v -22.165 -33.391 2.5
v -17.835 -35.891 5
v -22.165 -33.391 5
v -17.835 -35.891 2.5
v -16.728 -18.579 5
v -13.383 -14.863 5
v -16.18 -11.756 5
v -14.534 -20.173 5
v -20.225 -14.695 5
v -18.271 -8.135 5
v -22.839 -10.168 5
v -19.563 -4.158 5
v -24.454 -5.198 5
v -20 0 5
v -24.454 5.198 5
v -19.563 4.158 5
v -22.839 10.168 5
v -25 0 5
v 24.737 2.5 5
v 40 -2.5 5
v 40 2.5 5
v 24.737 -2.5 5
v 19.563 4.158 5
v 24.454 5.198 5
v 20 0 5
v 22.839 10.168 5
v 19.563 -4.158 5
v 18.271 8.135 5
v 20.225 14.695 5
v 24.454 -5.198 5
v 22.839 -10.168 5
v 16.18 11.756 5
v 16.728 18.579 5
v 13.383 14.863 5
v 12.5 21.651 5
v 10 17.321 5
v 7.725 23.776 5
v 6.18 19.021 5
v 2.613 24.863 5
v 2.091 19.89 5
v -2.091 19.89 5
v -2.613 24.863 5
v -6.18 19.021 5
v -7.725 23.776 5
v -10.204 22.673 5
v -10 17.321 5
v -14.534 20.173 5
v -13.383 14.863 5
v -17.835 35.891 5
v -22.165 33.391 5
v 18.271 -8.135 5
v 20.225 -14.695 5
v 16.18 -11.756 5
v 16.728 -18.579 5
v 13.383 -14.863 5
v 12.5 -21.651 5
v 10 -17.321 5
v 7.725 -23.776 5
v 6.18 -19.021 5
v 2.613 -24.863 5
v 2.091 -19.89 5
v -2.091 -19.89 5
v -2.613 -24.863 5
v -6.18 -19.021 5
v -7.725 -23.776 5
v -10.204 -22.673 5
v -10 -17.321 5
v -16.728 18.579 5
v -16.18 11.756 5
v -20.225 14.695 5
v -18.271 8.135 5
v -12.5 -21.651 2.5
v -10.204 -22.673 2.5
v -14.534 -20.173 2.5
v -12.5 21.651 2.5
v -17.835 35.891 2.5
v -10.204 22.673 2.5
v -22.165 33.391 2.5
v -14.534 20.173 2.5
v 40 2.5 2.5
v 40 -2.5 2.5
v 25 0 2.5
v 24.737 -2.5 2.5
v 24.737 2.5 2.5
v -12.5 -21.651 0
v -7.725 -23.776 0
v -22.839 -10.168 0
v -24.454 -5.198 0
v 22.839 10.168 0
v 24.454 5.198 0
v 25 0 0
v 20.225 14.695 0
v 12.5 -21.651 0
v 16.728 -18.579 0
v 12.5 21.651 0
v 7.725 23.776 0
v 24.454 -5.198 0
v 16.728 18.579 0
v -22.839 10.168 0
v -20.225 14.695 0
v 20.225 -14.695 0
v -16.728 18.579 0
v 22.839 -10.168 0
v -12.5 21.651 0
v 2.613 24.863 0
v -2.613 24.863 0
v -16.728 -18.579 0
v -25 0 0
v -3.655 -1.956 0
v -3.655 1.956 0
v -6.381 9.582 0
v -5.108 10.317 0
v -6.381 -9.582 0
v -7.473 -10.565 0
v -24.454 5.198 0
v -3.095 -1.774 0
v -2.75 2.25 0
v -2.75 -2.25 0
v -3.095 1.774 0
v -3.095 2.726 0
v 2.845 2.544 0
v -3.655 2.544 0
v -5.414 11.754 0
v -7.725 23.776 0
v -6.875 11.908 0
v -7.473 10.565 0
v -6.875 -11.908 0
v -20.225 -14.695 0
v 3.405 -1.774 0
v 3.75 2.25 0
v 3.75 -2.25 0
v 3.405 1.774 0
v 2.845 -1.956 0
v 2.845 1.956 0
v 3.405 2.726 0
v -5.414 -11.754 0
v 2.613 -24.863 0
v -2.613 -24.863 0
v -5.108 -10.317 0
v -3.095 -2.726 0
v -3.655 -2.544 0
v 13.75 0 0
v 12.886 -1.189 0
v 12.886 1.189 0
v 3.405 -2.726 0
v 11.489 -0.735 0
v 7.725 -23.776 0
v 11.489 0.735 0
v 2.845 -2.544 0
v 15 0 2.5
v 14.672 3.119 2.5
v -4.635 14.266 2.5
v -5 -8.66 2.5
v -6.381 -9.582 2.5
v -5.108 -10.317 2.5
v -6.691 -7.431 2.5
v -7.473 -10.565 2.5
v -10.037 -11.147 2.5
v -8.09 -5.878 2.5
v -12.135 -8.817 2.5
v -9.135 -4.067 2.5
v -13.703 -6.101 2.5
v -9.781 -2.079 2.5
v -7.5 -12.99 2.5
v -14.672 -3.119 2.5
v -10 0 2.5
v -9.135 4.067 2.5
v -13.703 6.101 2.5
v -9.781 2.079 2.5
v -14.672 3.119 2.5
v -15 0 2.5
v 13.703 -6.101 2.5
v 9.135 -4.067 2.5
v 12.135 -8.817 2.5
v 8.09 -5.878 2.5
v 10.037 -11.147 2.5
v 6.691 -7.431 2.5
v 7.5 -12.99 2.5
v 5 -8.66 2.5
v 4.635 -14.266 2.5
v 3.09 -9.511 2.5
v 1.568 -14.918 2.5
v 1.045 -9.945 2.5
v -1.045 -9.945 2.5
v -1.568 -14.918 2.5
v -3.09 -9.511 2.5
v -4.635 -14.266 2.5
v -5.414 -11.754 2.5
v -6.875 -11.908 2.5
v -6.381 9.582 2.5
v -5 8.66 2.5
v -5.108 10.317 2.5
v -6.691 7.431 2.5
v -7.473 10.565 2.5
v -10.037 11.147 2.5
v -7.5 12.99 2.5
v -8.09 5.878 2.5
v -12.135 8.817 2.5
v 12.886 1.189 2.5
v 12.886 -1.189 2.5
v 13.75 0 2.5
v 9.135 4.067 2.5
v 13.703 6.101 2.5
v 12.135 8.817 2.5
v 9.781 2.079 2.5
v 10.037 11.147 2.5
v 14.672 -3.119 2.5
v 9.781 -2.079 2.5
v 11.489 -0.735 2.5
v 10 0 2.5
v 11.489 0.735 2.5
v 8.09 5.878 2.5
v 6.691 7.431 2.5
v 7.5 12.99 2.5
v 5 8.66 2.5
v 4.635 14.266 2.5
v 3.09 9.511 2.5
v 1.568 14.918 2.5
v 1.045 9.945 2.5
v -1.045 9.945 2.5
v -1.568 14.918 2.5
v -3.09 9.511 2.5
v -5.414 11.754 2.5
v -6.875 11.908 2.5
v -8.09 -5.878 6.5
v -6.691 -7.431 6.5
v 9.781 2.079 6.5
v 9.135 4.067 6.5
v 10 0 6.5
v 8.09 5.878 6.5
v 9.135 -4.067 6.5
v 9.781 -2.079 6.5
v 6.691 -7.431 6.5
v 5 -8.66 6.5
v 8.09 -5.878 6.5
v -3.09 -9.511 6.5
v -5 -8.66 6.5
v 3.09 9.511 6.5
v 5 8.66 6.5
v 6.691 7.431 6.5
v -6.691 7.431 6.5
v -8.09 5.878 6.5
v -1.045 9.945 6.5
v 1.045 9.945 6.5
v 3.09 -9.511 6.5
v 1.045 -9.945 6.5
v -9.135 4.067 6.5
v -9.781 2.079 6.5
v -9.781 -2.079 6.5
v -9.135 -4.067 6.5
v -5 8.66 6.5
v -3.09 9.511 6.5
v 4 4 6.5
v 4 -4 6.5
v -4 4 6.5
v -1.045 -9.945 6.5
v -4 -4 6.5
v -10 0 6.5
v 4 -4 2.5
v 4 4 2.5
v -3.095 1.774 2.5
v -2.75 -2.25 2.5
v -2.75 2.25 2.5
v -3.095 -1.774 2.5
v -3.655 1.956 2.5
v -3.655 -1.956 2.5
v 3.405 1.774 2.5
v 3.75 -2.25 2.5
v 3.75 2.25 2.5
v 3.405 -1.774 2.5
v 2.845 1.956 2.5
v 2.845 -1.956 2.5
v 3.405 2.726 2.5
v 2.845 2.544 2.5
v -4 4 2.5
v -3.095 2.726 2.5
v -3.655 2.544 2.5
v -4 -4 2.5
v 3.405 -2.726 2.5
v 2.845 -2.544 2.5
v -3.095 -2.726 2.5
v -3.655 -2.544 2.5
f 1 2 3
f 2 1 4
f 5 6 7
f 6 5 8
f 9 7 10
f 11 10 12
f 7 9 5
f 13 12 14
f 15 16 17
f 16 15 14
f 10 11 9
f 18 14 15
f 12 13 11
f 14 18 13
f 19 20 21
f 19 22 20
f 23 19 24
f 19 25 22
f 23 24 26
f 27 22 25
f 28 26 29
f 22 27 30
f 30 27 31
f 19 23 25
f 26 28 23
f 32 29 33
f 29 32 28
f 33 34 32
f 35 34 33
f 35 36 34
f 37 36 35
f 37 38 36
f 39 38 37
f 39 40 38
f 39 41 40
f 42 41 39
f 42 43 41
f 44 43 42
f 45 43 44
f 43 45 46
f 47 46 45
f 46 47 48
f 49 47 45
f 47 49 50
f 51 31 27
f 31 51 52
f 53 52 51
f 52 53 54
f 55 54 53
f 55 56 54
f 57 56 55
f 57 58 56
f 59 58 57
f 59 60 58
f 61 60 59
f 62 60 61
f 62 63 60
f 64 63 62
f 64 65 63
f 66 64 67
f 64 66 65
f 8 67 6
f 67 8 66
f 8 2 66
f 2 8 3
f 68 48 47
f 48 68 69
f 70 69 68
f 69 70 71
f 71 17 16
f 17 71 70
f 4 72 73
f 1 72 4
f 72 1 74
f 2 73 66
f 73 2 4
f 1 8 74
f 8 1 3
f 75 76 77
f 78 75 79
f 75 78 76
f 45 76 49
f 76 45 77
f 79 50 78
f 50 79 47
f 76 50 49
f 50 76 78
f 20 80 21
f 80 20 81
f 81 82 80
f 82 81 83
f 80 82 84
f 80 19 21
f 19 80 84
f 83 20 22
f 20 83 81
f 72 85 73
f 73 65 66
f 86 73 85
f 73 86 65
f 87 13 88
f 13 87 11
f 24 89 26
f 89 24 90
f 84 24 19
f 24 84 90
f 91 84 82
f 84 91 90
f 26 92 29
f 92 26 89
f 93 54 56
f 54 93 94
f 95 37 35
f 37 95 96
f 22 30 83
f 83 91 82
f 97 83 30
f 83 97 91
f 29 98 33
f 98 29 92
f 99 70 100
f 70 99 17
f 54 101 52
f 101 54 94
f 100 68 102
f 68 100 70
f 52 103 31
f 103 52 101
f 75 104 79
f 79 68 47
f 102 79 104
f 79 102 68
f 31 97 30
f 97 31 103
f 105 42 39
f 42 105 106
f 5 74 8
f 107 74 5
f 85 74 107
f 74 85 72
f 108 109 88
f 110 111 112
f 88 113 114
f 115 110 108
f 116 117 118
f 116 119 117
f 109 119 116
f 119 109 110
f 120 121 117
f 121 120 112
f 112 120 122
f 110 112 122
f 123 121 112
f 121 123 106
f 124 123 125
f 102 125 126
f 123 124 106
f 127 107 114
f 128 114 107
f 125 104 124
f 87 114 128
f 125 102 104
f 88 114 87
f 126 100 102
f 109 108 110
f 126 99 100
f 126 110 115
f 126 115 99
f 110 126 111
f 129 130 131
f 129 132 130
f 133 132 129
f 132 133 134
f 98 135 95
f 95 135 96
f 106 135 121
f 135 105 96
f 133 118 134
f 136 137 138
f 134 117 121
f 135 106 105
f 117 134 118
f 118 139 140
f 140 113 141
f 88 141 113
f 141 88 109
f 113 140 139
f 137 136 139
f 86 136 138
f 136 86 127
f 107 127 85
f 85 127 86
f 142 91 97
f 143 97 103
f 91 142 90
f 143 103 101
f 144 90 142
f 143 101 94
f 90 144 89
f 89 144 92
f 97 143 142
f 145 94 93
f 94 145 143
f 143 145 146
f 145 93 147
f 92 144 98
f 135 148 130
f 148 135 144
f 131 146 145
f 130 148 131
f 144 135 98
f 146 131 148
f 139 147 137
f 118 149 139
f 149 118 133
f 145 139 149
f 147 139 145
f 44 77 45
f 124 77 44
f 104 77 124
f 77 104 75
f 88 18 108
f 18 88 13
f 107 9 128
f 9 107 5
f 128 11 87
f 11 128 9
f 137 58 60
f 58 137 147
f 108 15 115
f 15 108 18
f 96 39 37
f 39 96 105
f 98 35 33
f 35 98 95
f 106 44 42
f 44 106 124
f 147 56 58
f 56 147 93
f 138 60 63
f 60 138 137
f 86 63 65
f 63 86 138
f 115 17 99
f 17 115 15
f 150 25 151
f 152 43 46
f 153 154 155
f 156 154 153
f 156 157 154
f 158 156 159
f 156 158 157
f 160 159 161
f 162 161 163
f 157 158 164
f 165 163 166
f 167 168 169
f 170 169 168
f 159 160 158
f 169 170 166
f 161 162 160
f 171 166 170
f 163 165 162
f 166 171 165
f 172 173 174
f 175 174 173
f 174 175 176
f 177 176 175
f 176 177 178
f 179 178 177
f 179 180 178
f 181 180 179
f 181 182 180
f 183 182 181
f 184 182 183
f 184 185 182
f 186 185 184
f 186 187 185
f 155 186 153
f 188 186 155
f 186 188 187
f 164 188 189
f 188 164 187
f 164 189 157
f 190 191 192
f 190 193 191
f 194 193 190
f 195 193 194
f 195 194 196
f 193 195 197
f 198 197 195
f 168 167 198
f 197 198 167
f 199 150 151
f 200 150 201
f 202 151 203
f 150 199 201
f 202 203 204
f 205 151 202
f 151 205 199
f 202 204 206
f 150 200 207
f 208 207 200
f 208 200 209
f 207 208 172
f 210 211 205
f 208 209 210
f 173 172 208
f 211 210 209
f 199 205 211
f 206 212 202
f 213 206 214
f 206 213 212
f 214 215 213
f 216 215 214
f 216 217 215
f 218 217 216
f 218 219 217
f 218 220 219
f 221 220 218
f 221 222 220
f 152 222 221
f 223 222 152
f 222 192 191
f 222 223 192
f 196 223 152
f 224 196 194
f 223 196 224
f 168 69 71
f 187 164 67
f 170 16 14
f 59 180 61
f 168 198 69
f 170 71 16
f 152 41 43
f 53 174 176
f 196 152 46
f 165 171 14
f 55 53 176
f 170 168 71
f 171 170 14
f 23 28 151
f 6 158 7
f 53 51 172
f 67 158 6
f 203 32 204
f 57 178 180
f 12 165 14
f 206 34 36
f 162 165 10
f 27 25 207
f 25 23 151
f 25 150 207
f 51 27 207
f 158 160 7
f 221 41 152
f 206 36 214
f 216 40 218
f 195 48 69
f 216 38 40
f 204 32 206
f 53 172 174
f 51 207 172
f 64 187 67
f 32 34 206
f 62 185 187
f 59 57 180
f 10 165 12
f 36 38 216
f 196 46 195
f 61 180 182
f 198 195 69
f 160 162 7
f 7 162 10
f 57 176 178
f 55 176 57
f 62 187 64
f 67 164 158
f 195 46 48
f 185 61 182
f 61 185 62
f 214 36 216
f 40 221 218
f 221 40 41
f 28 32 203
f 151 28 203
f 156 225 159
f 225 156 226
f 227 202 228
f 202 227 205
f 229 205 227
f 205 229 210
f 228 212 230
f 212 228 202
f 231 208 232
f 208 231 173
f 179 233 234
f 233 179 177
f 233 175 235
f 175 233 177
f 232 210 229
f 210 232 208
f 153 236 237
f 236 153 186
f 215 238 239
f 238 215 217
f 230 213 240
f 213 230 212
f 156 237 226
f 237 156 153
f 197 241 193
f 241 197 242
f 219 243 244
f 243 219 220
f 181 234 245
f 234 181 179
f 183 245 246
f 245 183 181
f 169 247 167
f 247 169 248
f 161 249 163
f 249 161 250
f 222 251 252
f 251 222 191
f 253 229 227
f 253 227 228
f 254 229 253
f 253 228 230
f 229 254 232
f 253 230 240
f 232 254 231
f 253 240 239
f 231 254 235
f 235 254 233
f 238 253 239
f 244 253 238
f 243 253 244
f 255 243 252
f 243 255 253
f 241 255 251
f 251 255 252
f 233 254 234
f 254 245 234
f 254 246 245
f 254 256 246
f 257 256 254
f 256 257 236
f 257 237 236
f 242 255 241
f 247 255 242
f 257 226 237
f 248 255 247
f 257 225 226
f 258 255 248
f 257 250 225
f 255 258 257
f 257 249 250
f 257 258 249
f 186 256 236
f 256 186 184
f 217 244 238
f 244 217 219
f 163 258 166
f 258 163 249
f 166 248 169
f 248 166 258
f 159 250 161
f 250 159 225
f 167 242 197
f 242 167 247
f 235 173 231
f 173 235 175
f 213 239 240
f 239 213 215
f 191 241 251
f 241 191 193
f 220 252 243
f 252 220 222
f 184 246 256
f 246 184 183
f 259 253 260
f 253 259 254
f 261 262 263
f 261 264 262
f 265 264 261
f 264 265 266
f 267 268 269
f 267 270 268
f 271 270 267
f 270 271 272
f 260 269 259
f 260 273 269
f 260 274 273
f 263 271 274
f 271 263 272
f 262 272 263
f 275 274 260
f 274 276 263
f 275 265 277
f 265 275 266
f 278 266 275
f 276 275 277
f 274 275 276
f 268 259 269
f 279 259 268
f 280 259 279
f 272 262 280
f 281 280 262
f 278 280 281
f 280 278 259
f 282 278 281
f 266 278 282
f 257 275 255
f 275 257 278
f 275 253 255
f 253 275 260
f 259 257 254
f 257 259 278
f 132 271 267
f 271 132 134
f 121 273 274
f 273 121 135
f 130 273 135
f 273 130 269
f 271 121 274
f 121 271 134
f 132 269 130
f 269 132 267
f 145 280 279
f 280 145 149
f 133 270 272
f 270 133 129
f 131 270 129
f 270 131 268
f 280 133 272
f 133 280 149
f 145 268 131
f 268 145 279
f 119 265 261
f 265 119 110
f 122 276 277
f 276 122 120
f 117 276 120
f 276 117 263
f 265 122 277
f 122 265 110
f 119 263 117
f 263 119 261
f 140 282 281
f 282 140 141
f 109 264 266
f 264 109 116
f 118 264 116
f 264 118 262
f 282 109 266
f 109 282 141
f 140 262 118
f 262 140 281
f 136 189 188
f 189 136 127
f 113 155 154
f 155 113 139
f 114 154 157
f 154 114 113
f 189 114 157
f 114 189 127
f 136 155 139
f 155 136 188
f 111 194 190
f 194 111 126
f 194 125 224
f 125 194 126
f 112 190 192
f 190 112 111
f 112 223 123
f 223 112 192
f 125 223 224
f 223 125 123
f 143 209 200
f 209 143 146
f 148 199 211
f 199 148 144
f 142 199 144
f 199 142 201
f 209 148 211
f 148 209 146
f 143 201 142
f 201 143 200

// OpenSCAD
Base_Height=2.5;
Base_Radius=25;
Wing_Height=2.5;
Wing_Length=20;
Wing_Width=5;
Sensor_Width=8;
Sensor_Height=4;

Top_Inner_Radius=20;
Bot_Inner_Radius=15;
Sensor_Area_Radius=10;

Sensor_Hole_X=3.25;
Sensor_Hole_Y=2.25;
Sensor_Hole_R=.5;

Wire_Hole_R=1.25;

difference(){

difference(){

union(){

difference(){

union(){

rotate([0,0,240])translate([Base_Radius-Wing_Width,-Wing_Width/2,Base_Height])cube([Wing_Length,Wing_Width,Wing_Height]);

rotate([0,0,120])translate([Base_Radius-Wing_Width,-Wing_Width/2,Base_Height])cube([Wing_Length,Wing_Width,Wing_Height]);

translate([Base_Radius-Wing_Width,-Wing_Width/2,Base_Height])cube([Wing_Length,Wing_Width,Wing_Height]);

cylinder(Base_Height+Wing_Height,Base_Radius,Base_Radius);

}

union(){

translate([0,0,Base_Height])cylinder(Wing_Height,Bot_Inner_Radius,Top_Inner_Radius);

translate([0,0,Base_Height+Wing_Height])cylinder(1,Top_Inner_Radius,Top_Inner_Radius);

}

}

translate([0,0,Base_Height])cylinder(Sensor_Height,Sensor_Area_Radius,Sensor_Area_Radius);

}

translate([-Sensor_Width/2,-Sensor_Width/2,Base_Height])cube([Sensor_Width,Sensor_Width,Sensor_Height+1]);

}

union(){

translate([Sensor_Hole_X,Sensor_Hole_Y,-1])cylinder(Base_Height+2,Sensor_Hole_R,Sensor_Hole_R);

translate([Sensor_Hole_X,-Sensor_Hole_Y,-1])cylinder(Base_Height+2,Sensor_Hole_R,Sensor_Hole_R);

translate([-Sensor_Hole_X,Sensor_Hole_Y,-1])cylinder(Base_Height+2,Sensor_Hole_R,Sensor_Hole_R);

translate([-Sensor_Hole_X,-Sensor_Hole_Y,-1])cylinder(Base_Height+2,Sensor_Hole_R,Sensor_Hole_R);

rotate([0,0,240])translate([Bot_Inner_Radius/2+Sensor_Area_Radius/2,0,-1])cylinder(Base_Height+2,Wire_Hole_R,Wire_Hole_R);

rotate([0,0,120])translate([Bot_Inner_Radius/2+Sensor_Area_Radius/2,0,-1])cylinder(Base_Height+2,Wire_Hole_R,Wire_Hole_R);

translate([Bot_Inner_Radius/2+Sensor_Area_Radius/2,0,-1])cylinder(Base_Height+2,Wire_Hole_R,Wire_Hole_R);

}

}
